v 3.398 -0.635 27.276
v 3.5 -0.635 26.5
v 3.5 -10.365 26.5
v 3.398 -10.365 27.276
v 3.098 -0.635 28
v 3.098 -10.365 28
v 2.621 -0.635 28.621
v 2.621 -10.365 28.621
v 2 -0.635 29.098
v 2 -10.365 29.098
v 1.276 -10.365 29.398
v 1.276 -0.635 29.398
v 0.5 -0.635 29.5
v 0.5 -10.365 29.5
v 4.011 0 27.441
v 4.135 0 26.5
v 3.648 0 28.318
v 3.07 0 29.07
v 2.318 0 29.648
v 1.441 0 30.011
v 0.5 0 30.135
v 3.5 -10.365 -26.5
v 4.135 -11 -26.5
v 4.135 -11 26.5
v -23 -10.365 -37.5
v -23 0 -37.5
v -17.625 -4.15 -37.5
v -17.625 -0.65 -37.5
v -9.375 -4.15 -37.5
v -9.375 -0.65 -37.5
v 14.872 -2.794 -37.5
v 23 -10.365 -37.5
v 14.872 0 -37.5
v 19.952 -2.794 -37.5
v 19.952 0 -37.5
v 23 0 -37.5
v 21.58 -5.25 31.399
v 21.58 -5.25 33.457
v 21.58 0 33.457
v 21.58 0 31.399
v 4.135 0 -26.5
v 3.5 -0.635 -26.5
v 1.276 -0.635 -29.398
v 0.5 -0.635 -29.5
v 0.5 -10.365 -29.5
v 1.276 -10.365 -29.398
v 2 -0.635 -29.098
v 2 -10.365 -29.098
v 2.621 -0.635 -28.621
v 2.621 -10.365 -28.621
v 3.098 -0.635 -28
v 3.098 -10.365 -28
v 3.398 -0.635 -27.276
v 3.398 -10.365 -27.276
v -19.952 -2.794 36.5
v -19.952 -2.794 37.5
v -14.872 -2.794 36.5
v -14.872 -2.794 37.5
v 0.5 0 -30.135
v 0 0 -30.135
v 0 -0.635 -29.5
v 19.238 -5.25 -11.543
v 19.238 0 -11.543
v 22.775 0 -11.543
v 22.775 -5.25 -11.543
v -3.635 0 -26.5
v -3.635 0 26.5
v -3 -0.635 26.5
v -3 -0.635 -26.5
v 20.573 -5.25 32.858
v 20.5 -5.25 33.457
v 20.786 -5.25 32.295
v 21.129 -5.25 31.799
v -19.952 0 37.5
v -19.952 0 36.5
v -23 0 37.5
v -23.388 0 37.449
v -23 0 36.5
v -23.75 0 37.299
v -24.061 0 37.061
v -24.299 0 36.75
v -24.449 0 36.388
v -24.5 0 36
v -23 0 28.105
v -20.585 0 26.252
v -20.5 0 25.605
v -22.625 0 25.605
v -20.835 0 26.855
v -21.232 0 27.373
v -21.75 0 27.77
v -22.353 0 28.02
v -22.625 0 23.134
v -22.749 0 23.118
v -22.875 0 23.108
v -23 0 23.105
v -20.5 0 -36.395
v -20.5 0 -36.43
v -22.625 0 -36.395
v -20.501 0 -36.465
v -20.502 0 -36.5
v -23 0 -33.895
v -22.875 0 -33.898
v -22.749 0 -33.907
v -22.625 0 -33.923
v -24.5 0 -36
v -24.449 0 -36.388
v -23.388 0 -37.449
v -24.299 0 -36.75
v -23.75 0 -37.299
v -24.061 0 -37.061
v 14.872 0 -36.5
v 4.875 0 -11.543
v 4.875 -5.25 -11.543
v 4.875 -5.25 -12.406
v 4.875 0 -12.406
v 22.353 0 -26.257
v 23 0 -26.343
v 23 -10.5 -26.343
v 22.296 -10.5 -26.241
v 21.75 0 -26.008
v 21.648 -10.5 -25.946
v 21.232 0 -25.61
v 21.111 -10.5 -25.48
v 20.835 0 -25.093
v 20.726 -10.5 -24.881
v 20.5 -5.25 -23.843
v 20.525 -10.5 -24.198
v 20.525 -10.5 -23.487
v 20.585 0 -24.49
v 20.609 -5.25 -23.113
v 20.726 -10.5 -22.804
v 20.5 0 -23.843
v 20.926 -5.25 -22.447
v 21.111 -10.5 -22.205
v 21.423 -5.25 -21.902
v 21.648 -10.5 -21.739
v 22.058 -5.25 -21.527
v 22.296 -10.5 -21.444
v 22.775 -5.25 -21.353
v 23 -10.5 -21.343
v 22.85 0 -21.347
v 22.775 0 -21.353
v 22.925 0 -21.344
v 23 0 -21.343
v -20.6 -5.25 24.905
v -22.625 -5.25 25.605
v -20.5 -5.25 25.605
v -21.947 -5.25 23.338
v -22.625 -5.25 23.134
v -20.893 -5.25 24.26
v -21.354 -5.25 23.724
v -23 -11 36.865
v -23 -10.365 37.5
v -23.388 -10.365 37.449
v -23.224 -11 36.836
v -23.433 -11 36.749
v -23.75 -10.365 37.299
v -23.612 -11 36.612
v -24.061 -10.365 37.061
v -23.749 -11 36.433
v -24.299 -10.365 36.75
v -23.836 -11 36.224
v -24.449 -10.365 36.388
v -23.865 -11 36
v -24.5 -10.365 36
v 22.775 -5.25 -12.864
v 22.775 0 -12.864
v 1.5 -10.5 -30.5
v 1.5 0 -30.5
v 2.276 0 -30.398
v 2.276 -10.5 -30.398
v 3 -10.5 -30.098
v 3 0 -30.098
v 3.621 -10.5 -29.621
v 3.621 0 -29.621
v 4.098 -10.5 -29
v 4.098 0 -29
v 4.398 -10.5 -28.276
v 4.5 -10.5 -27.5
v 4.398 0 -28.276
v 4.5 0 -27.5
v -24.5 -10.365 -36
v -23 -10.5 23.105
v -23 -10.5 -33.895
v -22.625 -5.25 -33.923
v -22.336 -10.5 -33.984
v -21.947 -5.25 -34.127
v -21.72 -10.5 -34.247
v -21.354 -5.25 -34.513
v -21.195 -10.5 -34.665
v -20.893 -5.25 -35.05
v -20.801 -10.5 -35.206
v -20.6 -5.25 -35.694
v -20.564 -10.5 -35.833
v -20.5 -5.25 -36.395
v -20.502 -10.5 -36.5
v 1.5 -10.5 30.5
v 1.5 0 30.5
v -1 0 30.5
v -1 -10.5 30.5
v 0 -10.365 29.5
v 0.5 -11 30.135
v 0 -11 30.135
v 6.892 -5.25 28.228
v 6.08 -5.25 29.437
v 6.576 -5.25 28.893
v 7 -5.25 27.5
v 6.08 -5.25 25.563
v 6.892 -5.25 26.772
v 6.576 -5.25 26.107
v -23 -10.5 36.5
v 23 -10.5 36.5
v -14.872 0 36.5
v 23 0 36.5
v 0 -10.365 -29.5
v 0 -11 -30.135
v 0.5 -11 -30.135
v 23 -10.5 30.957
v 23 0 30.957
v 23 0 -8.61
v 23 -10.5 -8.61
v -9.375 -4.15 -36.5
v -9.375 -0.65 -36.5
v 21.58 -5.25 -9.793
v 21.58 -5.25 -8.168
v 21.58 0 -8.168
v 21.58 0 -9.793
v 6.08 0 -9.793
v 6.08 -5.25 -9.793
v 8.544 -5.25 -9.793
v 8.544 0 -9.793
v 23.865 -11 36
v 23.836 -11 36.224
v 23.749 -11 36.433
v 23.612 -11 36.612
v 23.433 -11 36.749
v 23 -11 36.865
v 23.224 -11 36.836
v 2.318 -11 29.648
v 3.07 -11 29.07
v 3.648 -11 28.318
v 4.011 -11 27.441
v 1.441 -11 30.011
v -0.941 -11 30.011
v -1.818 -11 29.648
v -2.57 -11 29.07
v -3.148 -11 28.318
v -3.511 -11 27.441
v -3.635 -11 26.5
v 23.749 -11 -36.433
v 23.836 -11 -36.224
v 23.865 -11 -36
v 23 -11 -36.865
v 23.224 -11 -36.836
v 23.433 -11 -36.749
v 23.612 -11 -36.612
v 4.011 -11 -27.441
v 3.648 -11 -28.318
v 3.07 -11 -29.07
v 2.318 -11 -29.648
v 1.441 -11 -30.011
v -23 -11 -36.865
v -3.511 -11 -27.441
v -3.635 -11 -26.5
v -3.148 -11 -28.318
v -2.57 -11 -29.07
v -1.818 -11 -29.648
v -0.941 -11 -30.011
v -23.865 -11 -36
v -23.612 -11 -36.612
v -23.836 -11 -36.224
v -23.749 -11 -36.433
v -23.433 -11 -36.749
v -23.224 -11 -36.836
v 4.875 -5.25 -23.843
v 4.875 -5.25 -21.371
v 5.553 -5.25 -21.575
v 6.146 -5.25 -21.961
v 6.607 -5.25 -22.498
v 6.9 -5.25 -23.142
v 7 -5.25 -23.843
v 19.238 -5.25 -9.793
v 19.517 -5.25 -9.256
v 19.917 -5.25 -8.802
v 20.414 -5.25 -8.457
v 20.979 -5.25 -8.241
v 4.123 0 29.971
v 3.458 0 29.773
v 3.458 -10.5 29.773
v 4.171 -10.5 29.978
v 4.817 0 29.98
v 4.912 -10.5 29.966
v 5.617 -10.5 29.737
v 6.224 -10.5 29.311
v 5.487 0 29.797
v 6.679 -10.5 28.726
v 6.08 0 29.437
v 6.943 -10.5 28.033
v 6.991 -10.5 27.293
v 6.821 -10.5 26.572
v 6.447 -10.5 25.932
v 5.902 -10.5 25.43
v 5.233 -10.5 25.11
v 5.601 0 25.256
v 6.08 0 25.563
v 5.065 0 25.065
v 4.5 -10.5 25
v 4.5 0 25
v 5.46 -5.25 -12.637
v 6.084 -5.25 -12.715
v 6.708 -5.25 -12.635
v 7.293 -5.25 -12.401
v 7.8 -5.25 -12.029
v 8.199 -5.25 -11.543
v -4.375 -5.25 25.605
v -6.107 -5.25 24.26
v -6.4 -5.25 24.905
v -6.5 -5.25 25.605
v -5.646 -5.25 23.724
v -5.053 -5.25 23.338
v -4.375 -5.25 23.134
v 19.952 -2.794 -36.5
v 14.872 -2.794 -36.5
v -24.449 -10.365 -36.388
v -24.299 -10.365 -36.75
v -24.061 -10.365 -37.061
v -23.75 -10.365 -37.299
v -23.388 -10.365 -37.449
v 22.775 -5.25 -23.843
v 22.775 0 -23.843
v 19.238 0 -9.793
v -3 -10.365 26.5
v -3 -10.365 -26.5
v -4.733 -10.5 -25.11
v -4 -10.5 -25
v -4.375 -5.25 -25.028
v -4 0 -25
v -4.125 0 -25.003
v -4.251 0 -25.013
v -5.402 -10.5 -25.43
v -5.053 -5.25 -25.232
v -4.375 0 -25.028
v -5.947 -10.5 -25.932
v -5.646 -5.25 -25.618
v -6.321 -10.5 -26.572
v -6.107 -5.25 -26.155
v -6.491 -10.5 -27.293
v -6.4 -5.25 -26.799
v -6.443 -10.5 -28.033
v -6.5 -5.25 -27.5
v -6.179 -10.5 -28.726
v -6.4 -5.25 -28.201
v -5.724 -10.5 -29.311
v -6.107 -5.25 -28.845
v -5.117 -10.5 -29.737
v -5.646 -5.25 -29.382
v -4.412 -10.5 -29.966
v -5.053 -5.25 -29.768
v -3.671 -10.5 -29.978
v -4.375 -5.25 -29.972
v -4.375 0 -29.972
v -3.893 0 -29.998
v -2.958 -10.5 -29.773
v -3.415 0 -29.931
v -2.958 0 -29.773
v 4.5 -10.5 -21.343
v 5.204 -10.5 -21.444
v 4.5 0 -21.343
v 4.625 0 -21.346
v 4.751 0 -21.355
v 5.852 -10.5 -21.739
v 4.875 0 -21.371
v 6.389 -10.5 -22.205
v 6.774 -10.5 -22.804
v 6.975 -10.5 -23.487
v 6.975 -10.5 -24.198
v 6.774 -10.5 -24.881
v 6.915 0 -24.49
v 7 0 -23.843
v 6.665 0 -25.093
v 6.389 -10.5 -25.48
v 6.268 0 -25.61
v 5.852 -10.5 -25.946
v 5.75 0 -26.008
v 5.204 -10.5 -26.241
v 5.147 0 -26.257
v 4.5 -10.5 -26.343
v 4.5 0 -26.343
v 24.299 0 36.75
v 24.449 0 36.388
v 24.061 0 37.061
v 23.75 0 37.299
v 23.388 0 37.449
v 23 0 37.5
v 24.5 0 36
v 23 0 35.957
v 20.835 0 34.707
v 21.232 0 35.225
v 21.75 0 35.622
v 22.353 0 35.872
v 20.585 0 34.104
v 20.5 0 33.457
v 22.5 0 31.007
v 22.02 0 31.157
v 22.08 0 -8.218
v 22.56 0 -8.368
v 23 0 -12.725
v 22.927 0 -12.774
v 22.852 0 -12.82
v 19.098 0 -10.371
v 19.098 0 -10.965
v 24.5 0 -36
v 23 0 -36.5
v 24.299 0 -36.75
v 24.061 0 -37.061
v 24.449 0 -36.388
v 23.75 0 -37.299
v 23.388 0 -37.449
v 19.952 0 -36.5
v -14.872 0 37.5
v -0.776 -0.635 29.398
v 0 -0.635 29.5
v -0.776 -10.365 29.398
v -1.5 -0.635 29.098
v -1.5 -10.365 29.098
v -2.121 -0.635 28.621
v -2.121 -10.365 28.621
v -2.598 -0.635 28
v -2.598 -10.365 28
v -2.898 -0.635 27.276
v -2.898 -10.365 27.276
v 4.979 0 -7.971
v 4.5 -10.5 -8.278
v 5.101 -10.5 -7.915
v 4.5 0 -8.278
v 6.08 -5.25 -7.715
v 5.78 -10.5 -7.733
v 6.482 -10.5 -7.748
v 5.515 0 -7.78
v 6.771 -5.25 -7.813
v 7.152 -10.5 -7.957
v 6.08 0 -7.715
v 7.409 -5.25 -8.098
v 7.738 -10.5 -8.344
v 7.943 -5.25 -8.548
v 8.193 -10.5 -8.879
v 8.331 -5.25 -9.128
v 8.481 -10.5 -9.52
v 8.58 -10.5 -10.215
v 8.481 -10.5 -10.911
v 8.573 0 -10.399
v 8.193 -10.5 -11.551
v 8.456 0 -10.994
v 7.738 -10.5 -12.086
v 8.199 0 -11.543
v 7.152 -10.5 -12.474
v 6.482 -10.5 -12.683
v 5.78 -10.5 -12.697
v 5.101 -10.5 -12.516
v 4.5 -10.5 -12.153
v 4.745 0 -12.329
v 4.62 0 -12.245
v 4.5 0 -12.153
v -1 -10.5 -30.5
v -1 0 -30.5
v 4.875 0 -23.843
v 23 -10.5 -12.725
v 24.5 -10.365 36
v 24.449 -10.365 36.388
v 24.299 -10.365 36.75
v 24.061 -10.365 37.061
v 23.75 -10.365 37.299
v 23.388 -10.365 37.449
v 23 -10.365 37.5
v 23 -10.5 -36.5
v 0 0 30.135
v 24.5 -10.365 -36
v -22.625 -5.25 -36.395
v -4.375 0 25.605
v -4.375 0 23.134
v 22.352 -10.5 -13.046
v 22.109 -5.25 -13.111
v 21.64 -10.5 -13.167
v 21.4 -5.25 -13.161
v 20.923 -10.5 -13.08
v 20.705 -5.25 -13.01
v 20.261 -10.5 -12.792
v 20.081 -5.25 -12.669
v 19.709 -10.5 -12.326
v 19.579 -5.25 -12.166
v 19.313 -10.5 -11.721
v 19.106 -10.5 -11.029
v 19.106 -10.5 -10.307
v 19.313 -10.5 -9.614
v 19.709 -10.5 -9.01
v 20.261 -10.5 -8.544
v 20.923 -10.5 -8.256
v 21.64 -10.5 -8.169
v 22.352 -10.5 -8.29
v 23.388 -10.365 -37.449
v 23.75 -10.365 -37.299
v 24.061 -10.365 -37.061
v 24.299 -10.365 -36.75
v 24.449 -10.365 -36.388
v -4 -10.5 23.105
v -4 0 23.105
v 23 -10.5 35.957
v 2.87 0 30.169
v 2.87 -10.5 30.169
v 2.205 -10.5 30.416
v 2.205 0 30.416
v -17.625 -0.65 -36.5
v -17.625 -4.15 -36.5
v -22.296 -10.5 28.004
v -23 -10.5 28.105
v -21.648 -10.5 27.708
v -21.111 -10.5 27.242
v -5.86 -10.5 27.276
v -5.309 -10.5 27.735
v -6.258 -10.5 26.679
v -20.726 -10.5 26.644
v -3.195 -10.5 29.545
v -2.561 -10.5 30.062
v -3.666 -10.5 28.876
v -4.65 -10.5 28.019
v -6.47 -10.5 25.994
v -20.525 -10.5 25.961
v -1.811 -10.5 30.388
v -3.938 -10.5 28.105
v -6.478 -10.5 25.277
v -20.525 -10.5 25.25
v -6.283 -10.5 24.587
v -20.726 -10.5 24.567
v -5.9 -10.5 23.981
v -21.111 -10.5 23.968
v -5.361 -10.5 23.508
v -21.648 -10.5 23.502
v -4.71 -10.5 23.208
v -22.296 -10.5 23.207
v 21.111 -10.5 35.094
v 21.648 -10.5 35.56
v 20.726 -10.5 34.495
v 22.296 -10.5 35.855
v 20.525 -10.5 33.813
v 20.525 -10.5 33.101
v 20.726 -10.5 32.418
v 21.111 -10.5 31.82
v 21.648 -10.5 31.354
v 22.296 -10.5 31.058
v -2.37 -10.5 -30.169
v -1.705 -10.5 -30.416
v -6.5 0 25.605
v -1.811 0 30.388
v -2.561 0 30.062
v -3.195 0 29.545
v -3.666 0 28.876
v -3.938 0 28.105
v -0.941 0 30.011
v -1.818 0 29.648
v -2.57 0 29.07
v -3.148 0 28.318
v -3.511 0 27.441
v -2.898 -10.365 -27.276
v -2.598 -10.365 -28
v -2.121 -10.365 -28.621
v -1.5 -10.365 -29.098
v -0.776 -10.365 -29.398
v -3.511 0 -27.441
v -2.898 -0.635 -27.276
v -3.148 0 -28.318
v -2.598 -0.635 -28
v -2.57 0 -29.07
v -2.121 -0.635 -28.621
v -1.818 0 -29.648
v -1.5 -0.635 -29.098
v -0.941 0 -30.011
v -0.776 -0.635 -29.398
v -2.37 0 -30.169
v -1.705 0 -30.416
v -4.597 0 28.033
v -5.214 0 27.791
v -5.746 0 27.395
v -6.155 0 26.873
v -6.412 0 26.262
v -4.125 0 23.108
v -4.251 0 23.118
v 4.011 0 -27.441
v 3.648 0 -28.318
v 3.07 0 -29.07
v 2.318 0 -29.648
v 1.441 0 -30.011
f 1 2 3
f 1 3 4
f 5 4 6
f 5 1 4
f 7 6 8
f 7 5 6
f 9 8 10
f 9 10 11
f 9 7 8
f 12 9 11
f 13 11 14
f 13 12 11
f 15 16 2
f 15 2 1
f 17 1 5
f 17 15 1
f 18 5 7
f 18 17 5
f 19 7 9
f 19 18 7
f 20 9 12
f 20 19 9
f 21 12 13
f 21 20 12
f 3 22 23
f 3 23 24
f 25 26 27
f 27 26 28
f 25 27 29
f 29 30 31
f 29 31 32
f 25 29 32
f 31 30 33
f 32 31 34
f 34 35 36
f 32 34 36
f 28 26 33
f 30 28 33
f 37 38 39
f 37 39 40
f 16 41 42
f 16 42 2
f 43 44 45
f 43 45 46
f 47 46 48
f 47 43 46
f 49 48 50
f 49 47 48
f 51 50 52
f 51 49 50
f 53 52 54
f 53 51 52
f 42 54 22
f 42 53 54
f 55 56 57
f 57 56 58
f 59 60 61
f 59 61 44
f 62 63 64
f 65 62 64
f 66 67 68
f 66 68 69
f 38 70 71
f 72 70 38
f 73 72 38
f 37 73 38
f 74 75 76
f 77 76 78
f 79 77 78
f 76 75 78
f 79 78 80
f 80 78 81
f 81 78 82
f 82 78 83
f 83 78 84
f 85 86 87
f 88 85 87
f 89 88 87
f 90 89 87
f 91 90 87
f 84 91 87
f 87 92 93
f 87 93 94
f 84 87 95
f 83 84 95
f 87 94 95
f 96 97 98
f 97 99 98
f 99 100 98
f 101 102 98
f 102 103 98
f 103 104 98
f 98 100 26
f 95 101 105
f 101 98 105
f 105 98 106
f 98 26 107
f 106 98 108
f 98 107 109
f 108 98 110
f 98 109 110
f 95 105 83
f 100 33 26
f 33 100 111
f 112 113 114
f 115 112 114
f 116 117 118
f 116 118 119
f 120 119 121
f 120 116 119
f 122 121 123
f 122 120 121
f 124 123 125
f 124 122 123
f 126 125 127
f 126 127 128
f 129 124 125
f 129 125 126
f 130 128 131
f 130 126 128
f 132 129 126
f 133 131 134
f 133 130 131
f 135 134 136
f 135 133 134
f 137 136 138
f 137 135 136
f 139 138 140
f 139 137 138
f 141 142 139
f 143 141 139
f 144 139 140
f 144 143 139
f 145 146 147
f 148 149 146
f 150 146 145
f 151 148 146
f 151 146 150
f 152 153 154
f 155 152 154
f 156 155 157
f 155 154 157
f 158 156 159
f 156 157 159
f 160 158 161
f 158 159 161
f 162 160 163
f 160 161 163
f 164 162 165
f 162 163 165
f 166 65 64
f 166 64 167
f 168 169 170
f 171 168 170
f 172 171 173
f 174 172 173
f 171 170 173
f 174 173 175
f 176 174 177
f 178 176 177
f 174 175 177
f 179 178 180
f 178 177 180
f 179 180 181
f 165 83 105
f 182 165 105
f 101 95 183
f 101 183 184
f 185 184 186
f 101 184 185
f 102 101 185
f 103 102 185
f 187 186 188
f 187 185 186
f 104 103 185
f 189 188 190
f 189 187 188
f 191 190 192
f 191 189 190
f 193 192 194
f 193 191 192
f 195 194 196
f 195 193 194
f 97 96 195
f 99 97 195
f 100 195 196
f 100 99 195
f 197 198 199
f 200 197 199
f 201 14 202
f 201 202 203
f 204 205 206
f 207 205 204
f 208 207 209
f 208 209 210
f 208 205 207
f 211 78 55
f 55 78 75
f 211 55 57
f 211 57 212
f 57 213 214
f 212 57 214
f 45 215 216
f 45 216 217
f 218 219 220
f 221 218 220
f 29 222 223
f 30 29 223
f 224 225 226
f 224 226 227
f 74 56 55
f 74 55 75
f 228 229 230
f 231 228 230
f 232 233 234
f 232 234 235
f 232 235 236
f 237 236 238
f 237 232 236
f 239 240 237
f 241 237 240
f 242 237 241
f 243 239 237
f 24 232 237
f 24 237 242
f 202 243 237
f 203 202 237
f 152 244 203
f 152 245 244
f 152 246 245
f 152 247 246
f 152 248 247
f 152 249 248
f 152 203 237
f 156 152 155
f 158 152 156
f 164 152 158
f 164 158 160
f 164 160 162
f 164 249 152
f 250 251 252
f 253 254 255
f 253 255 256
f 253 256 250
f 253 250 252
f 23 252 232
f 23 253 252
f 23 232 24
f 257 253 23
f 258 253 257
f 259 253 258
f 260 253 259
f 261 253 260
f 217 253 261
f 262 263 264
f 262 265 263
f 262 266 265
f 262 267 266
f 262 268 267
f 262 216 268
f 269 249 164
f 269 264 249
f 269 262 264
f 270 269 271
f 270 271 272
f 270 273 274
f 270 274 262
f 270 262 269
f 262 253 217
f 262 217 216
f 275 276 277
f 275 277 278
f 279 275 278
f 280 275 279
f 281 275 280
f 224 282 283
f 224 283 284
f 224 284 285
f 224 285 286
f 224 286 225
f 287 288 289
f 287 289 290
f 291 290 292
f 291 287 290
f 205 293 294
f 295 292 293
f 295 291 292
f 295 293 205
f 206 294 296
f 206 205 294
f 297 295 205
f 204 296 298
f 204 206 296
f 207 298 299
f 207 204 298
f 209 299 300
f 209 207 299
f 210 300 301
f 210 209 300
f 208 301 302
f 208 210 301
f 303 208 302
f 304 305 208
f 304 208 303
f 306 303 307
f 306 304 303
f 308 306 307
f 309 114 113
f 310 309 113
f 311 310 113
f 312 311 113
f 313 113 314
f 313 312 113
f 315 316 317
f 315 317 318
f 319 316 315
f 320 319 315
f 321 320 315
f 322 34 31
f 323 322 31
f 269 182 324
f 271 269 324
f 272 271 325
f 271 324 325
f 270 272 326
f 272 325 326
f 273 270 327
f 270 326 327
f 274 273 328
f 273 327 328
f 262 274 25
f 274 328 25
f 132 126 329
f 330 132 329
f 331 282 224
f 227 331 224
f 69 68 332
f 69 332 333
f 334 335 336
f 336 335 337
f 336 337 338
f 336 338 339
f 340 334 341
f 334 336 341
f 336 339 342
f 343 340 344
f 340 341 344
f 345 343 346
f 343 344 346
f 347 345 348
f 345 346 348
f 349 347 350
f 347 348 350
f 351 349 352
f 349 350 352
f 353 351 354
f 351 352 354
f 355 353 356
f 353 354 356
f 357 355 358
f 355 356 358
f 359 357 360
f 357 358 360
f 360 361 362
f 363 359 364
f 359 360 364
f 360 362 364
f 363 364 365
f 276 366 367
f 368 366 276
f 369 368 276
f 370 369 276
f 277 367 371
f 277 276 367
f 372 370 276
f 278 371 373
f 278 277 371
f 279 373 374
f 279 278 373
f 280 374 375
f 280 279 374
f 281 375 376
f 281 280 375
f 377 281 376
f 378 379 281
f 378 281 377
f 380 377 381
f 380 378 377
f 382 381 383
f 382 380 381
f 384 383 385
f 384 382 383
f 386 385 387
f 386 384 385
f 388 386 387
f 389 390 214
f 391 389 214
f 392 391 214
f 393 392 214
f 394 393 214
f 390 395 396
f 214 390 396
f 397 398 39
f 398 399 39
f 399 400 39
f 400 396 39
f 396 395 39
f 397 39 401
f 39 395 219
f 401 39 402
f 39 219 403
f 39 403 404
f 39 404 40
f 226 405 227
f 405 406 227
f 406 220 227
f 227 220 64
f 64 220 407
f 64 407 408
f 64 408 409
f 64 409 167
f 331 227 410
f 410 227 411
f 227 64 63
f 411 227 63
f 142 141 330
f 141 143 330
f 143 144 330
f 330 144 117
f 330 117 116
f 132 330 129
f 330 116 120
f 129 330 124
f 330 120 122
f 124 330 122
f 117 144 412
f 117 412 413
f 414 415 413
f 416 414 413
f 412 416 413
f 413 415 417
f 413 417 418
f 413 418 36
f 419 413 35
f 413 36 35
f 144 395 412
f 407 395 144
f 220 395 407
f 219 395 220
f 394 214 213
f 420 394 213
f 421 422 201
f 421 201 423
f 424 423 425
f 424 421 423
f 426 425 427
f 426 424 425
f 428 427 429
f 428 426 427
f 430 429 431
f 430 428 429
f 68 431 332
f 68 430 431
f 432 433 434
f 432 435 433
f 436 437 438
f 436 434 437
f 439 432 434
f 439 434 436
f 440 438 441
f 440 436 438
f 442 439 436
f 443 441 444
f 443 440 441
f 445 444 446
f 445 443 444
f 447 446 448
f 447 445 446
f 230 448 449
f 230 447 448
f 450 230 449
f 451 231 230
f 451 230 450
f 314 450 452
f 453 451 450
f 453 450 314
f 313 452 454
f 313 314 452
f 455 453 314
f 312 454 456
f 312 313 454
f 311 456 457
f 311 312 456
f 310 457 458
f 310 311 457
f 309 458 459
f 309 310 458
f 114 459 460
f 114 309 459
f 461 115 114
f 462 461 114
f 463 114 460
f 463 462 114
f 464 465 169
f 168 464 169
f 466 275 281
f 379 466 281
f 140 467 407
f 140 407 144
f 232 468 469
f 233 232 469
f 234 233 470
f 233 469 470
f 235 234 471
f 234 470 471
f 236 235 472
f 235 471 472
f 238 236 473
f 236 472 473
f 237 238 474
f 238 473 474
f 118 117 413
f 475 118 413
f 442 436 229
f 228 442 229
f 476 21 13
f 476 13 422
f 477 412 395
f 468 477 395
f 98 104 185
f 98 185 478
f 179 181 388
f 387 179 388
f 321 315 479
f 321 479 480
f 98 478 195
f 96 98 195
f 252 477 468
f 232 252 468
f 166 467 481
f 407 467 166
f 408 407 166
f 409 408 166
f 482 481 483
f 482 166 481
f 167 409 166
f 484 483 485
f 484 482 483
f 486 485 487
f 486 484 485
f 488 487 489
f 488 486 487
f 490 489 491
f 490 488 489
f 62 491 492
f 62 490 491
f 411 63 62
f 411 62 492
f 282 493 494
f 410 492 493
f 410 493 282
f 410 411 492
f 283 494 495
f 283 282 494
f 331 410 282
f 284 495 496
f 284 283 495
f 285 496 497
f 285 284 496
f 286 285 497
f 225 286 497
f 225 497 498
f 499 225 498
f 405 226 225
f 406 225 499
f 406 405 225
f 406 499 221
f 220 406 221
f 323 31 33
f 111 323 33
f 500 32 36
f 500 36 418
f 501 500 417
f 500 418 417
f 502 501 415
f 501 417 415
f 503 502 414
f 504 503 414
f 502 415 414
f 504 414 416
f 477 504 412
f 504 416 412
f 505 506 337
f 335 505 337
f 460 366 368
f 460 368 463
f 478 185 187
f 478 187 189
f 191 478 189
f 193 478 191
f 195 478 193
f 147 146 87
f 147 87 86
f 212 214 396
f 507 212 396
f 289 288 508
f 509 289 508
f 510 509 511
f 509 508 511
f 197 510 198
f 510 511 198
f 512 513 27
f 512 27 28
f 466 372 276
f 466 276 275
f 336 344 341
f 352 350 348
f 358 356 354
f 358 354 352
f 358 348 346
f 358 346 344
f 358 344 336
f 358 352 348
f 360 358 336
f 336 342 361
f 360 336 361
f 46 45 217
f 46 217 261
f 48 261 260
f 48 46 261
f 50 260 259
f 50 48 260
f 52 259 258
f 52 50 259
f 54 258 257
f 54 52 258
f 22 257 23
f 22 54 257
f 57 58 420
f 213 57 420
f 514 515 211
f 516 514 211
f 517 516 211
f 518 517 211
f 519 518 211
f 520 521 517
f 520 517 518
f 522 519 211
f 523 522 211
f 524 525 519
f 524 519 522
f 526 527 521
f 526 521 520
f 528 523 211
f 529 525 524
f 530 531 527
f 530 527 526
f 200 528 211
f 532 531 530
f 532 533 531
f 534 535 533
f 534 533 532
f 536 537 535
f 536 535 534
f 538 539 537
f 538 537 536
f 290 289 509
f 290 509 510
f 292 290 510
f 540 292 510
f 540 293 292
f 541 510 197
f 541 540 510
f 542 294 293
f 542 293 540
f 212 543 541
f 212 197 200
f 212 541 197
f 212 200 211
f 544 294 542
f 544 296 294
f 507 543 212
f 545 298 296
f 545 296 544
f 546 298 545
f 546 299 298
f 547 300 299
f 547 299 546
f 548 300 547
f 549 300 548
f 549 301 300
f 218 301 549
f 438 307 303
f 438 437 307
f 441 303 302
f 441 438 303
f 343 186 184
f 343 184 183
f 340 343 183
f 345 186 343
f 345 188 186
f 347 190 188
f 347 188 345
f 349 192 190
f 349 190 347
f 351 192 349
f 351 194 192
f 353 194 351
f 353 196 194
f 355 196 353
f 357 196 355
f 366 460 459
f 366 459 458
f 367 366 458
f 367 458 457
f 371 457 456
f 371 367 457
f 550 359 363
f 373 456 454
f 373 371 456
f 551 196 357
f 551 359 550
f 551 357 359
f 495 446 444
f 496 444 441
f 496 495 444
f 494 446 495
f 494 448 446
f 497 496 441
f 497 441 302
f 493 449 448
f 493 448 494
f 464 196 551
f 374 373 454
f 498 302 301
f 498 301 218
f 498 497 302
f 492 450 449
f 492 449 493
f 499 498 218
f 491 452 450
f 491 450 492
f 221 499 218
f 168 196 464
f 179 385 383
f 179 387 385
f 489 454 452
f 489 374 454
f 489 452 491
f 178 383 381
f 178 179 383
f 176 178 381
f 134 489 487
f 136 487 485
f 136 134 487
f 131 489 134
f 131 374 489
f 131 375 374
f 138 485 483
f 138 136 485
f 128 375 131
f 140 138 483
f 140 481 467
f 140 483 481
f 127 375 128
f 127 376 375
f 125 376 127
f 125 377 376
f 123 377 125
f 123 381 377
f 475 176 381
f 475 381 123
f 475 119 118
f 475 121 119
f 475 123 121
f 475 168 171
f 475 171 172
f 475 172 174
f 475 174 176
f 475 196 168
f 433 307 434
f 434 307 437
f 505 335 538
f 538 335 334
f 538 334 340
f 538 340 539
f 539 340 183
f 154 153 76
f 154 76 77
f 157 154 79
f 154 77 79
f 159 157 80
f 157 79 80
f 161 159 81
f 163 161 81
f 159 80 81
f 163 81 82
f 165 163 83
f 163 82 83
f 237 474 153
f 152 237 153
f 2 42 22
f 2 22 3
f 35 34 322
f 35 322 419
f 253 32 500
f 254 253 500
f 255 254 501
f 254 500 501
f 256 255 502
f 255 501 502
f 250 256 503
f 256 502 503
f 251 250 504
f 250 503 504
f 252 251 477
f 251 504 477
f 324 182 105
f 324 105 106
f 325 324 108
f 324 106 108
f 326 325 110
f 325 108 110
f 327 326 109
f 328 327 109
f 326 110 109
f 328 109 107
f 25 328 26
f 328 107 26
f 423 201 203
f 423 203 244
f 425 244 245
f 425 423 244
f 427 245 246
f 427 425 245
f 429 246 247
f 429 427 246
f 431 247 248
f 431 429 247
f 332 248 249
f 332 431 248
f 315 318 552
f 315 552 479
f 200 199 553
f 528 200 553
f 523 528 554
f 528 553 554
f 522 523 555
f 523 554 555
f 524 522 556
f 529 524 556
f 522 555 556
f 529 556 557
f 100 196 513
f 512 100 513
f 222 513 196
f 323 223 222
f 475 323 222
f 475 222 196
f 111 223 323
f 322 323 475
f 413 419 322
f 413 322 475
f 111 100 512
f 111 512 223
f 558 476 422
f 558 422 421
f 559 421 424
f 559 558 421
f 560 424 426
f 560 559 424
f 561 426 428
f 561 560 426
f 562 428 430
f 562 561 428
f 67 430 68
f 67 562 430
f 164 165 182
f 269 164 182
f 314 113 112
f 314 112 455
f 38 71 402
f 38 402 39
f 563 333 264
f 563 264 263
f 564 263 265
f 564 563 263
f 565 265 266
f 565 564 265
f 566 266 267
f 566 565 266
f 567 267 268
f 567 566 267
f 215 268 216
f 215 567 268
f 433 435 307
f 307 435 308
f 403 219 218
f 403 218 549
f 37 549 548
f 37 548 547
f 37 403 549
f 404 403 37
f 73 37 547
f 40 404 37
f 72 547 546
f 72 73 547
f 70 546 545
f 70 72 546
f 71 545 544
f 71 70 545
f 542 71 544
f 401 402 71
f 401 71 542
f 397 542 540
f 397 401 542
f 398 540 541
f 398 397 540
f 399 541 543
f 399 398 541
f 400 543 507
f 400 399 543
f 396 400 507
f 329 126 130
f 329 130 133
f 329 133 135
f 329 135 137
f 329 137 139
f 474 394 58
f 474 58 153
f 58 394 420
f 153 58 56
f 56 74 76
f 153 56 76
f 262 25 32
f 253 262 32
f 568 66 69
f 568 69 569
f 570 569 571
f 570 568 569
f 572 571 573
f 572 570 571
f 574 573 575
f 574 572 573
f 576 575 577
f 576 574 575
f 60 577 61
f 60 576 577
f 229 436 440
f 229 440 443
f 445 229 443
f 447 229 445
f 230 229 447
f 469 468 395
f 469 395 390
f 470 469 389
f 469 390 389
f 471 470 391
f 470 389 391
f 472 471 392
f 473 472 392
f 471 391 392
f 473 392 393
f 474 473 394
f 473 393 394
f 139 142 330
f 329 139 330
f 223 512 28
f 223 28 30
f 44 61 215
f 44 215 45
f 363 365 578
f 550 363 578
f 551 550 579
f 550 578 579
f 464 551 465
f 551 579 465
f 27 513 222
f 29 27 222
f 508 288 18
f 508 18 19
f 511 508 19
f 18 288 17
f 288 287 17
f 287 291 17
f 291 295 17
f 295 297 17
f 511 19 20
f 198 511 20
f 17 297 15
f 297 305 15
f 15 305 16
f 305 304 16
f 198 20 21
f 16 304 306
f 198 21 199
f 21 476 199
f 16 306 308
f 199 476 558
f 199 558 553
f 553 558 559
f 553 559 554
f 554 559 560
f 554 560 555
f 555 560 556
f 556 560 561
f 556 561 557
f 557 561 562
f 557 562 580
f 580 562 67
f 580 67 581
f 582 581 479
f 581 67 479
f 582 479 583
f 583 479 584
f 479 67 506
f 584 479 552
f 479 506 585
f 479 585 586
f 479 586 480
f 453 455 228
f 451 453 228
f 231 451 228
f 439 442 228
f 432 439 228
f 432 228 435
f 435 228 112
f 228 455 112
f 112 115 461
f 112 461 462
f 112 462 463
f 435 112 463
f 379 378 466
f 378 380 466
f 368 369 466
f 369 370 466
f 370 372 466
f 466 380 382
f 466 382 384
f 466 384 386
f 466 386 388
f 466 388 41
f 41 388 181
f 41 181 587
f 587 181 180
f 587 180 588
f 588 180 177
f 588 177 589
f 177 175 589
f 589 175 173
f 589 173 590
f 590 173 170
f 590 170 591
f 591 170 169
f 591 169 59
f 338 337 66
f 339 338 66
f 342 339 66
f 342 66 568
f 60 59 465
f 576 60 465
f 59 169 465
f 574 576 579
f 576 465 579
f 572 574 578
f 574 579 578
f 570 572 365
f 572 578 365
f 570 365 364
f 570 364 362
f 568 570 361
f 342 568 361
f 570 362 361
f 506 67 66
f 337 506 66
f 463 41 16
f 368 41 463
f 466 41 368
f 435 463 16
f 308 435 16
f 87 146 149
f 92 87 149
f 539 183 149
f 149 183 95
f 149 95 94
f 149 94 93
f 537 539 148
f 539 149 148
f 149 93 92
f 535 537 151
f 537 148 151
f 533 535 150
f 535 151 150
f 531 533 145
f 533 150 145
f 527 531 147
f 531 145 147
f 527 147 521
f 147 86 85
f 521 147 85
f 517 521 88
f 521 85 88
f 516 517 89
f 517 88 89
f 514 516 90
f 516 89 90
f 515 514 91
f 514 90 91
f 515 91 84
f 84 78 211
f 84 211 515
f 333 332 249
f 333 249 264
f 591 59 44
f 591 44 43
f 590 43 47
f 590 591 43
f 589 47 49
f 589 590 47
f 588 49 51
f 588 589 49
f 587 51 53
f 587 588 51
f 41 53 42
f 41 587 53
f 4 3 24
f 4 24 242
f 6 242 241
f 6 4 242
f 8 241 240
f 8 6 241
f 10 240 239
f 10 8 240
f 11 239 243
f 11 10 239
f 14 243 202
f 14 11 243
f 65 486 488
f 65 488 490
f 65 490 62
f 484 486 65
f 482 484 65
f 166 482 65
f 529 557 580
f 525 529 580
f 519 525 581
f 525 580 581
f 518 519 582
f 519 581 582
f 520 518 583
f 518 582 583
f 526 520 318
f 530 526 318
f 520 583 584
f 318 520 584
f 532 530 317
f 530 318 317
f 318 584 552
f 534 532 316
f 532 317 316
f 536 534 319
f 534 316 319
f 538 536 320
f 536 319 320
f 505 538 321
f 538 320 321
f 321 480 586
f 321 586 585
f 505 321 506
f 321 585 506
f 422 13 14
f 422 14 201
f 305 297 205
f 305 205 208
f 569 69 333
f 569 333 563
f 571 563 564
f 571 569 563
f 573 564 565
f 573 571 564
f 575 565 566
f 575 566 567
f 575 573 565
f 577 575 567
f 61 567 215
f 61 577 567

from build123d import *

# Parameters (mm, degrees)
BOSS_EXTRUDE1_DEPTH = 11
SKETCH8_W           = 46
SKETCH8_H           = 73
CUT_EXTRUDE1_DEPTH  = 10.5
BOSS_EXTRUDE2_START = 10.5
SKETCH9_R           = 2.5
BOSS_EXTRUDE2_DEPTH = 10.5
SKETCH10_W          = 15.5
SKETCH10_H          = 43.25
SKETCH10_W_2        = 17.9
SKETCH10_H_2        = 12.3
SKETCH10_W_3        = 18.25
SKETCH10_H_3        = 62
CUT_EXTRUDE3_DEPTH  = 5.25
SKETCH14_W          = 8.25
SKETCH14_H          = 3.5
CUT_EXTRUDE6_DEPTH  = 5
CUT_EXTRUDE7_REACH  = 81.663
SKETCH15_W          = 5.08
SKETCH15_H          = 2.794
CUT_EXTRUDE8_REACH  = 81.663
SKETCH16_W          = 5.08
SKETCH16_H          = 2.794
CHAMFER1_SIZE       = 0.635


with BuildPart() as part:
    # Sketch2 → Boss-Extrude1 (new body)
    with BuildSketch(Plane(origin=(0, 0, 0), x_dir=(1, 0, 0), z_dir=(0, 1, 0))):
        with BuildLine():
            Line((23, -37.5), (-23, -37.5))
            ThreePointArc((-23, -37.5), (-24.060660172, -37.060660172), (-24.5, -36))
            Line((-24.5, -36), (-24.5, 36))
            ThreePointArc((-24.5, 36), (-24.060660172, 37.060660172), (-23, 37.5))
            Line((-23, 37.5), (23, 37.5))
            ThreePointArc((23, 37.5), (24.060660172, 37.060660172), (24.5, 36))
            Line((24.5, 36), (24.5, -36))
            ThreePointArc((24.5, -36), (24.060660172, -37.060660172), (23, -37.5))
        make_face()
        with BuildLine():
            Line((0, 29.5), (0.5, 29.5))
            ThreePointArc((0.5, 29.5), (2.621320344, 28.621320344), (3.5, 26.5))
            Line((3.5, 26.5), (3.5, -26.5))
            ThreePointArc((3.5, -26.5), (2.621320344, -28.621320344), (0.5, -29.5))
            Line((0.5, -29.5), (0, -29.5))
            ThreePointArc((0, -29.5), (-2.121320344, -28.621320344), (-3, -26.5))
            Line((-3, -26.5), (-3, 26.5))
            ThreePointArc((-3, 26.5), (-2.121320344, 28.621320344), (0, 29.5))
        make_face(mode=Mode.SUBTRACT)
    extrude(amount=-BOSS_EXTRUDE1_DEPTH)

    # Sketch8 → Cut-Extrude1 (cut)
    # profile 1 of 2: a face of its own
    with BuildSketch(Plane(origin=(0, 0, 0), x_dir=(1, 0, 0), z_dir=(0, 1, 0))):
        Rectangle(SKETCH8_W, SKETCH8_H)
        with BuildLine():
            Line((-1, 30.5), (1.5, 30.5))
            ThreePointArc((1.5, 30.5), (3.621320344, 29.621320344), (4.5, 27.5))
            Line((4.5, 27.5), (4.5, -27.5))
            ThreePointArc((4.5, -27.5), (3.621320344, -29.621320344), (1.5, -30.5))
            Line((1.5, -30.5), (-1, -30.5))
            ThreePointArc((-1, -30.5), (-3.121320344, -29.621320344), (-4, -27.5))
            Line((-4, -27.5), (-4, 27.5))
            ThreePointArc((-4, 27.5), (-3.121320344, 29.621320344), (-1, 30.5))
        make_face(mode=Mode.SUBTRACT)
    # profile 2 of 2: a face of its own
    with BuildSketch(Plane(origin=(0, 0, 0), x_dir=(1, 0, 0), z_dir=(0, 1, 0))):
        with BuildLine():
            Line((0, 29.5), (0.5, 29.5))
            ThreePointArc((0.5, 29.5), (2.621320344, 28.621320344), (3.5, 26.5))
            Line((3.5, 26.5), (3.5, -26.5))
            ThreePointArc((3.5, -26.5), (2.621320344, -28.621320344), (0.5, -29.5))
            Line((0.5, -29.5), (0, -29.5))
            ThreePointArc((0, -29.5), (-2.121320344, -28.621320344), (-3, -26.5))
            Line((-3, -26.5), (-3, 26.5))
            ThreePointArc((-3, 26.5), (-2.121320344, 28.621320344), (0, 29.5))
        make_face()
    extrude(amount=-CUT_EXTRUDE1_DEPTH, mode=Mode.SUBTRACT)

    # Sketch9 → Boss-Extrude2 (add)
    with BuildSketch(Plane(origin=(0, -10.5, 0), x_dir=(1, 0, 0), z_dir=(0, 1, 0)).offset(BOSS_EXTRUDE2_START)):
        with Locations((21.58, 10.667919779)):
            Circle(SKETCH9_R)
        with Locations((6.08, 10.21529089)):
            Circle(SKETCH9_R)
        with BuildLine():
            Line((24.5, -35.456747529), (24.5, -31.456747529))
            ThreePointArc((24.5, -31.456747529), (20.5, -33.456747529), (24.5, -35.456747529))
        make_face()
        with BuildLine():
            Line((4.5, 26.342587088), (4.5, 21.342587088))
            ThreePointArc((4.5, 21.342587088), (7, 23.842587088), (4.5, 26.342587088))
        make_face()
        with BuildLine():
            Line((-4, 27.5), (-4, 25))
            ThreePointArc((-4, 25), (-6.442500859, 28.033094319), (-2.958333333, 29.772648357))
            ThreePointArc((-2.958333333, 29.772648357), (-3.727178029, 28.75), (-4, 27.5))
        make_face()
        with BuildLine():
            Line((-24.5, -27.605307327), (-24.5, -23.605307327))
            ThreePointArc((-24.5, -23.605307327), (-20.5, -25.605307327), (-24.5, -27.605307327))
        make_face()
        with BuildLine():
            Line((-20.757613835, 37.5), (-23, 37.5))
            ThreePointArc((-23, 37.5), (-24.060660172, 37.060660172), (-24.5, 36))
            Line((-24.5, 36), (-24.5, 34.394692673))
            ThreePointArc((-24.5, 34.394692673), (-21.40359225, 34.470769001), (-20.757613835, 37.5))
        make_face()
        with BuildLine():
            Line((24.5, 21.842587088), (24.5, 25.842587088))
            ThreePointArc((24.5, 25.842587088), (20.5, 23.842587088), (24.5, 21.842587088))
        make_face()
        with BuildLine():
            Line((-4, -23.105307327), (-4, -27.5))
            ThreePointArc((-4, -27.5), (-3.984574172, -27.803837144), (-3.938455326, -28.104549663))
            ThreePointArc((-3.938455326, -28.104549663), (-6.499810577, -25.636081995), (-4, -23.105307327))
        make_face()
        with BuildLine():
            Line((4.5, -25), (4.5, -27.5))
            ThreePointArc((4.5, -27.5), (4.227178029, -28.75), (3.458333333, -29.772648357))
            ThreePointArc((3.458333333, -29.772648357), (6.942500859, -28.033094319), (4.5, -25))
        make_face()
    extrude(amount=-BOSS_EXTRUDE2_DEPTH)

    # Sketch10 → Cut-Extrude3 (cut)
    with BuildSketch(Plane(origin=(0, -5.25, 0), x_dir=(1, 0, 0), z_dir=(0, 1, 0))):
        with Locations((13.83, -11.831747529)):
            Rectangle(SKETCH10_W, SKETCH10_H)
        with Locations((13.825, 17.692587088)):
            Rectangle(SKETCH10_W_2, SKETCH10_H_2)
        with Locations((-13.5, 5.394692673)):
            Rectangle(SKETCH10_W_3, SKETCH10_H_3)
    extrude(amount=CUT_EXTRUDE3_DEPTH, mode=Mode.SUBTRACT)

    # Sketch14 → Cut-Extrude6 (cut)
    with BuildSketch(Plane.XY.offset(-36.5)):
        with Locations((-13.5, -2.4)):
            Rectangle(SKETCH14_W, SKETCH14_H)
    extrude(amount=-CUT_EXTRUDE6_DEPTH, mode=Mode.SUBTRACT)

    # Sketch15 → Cut-Extrude7 (cut, up to next)
    with BuildSketch(Plane(origin=(0, 0, -37.5), x_dir=(-1, 0, 0), z_dir=(0, 0, -1)), mode=Mode.PRIVATE) as cut_extrude7_sk1:
        with Locations((-17.412, -1.397)):
            Rectangle(SKETCH15_W, SKETCH15_H)
    cut_extrude7_tool1 = extrude(cut_extrude7_sk1.sketch, amount=-CUT_EXTRUDE7_REACH, mode=Mode.PRIVATE) & part.part
    add(cut_extrude7_tool1.solids().sort_by_distance((17.412, -1.397, -37.5))[0], mode=Mode.SUBTRACT)

    # Sketch16 → Cut-Extrude8 (cut, up to next)
    with BuildSketch(Plane.XY.offset(37.5), mode=Mode.PRIVATE) as cut_extrude8_sk1:
        with Locations((-17.412, -1.397)):
            Rectangle(SKETCH16_W, SKETCH16_H)
    cut_extrude8_tool1 = extrude(cut_extrude8_sk1.sketch, amount=-CUT_EXTRUDE8_REACH, mode=Mode.PRIVATE) & part.part
    add(cut_extrude8_tool1.solids().sort_by_distance((-17.412, -1.397, 37.5))[0], mode=Mode.SUBTRACT)

    # Chamfer1
    chamfer1_edges = [part.edges().sort_by_distance(p)[0] for p in [
        (-24.060660172, -11, -37.060660172),
        (-24.5, -11, 0),
        (-2.121320344, 0, -28.621320344),
        (-3, 0, 0),
        (-2.121320344, 0, 28.621320344),
        (0.25, 0, 29.5),
        (2.621320344, 0, 28.621320344),
        (3.5, 0, 0),
        (-24.060660172, -11, 37.060660172),
        (2.621320344, 0, -28.621320344),
        (0.25, 0, -29.5),
        (0, -11, 37.5),
        (24.060660172, -11, 37.060660172),
        (24.5, -11, 0),
        (24.060660172, -11, -37.060660172),
        (0.25, -11, -29.5),
        (2.621320344, -11, -28.621320344),
        (3.5, -11, 0),
        (0, -11, -37.5),
        (2.621320344, -11, 28.621320344),
        (0.25, -11, 29.5),
        (-2.121320344, -11, 28.621320344),
        (-3, -11, 0),
        (-2.121320344, -11, -28.621320344),
    ]]
    chamfer(chamfer1_edges, length=CHAMFER1_SIZE)


solid = part.part
